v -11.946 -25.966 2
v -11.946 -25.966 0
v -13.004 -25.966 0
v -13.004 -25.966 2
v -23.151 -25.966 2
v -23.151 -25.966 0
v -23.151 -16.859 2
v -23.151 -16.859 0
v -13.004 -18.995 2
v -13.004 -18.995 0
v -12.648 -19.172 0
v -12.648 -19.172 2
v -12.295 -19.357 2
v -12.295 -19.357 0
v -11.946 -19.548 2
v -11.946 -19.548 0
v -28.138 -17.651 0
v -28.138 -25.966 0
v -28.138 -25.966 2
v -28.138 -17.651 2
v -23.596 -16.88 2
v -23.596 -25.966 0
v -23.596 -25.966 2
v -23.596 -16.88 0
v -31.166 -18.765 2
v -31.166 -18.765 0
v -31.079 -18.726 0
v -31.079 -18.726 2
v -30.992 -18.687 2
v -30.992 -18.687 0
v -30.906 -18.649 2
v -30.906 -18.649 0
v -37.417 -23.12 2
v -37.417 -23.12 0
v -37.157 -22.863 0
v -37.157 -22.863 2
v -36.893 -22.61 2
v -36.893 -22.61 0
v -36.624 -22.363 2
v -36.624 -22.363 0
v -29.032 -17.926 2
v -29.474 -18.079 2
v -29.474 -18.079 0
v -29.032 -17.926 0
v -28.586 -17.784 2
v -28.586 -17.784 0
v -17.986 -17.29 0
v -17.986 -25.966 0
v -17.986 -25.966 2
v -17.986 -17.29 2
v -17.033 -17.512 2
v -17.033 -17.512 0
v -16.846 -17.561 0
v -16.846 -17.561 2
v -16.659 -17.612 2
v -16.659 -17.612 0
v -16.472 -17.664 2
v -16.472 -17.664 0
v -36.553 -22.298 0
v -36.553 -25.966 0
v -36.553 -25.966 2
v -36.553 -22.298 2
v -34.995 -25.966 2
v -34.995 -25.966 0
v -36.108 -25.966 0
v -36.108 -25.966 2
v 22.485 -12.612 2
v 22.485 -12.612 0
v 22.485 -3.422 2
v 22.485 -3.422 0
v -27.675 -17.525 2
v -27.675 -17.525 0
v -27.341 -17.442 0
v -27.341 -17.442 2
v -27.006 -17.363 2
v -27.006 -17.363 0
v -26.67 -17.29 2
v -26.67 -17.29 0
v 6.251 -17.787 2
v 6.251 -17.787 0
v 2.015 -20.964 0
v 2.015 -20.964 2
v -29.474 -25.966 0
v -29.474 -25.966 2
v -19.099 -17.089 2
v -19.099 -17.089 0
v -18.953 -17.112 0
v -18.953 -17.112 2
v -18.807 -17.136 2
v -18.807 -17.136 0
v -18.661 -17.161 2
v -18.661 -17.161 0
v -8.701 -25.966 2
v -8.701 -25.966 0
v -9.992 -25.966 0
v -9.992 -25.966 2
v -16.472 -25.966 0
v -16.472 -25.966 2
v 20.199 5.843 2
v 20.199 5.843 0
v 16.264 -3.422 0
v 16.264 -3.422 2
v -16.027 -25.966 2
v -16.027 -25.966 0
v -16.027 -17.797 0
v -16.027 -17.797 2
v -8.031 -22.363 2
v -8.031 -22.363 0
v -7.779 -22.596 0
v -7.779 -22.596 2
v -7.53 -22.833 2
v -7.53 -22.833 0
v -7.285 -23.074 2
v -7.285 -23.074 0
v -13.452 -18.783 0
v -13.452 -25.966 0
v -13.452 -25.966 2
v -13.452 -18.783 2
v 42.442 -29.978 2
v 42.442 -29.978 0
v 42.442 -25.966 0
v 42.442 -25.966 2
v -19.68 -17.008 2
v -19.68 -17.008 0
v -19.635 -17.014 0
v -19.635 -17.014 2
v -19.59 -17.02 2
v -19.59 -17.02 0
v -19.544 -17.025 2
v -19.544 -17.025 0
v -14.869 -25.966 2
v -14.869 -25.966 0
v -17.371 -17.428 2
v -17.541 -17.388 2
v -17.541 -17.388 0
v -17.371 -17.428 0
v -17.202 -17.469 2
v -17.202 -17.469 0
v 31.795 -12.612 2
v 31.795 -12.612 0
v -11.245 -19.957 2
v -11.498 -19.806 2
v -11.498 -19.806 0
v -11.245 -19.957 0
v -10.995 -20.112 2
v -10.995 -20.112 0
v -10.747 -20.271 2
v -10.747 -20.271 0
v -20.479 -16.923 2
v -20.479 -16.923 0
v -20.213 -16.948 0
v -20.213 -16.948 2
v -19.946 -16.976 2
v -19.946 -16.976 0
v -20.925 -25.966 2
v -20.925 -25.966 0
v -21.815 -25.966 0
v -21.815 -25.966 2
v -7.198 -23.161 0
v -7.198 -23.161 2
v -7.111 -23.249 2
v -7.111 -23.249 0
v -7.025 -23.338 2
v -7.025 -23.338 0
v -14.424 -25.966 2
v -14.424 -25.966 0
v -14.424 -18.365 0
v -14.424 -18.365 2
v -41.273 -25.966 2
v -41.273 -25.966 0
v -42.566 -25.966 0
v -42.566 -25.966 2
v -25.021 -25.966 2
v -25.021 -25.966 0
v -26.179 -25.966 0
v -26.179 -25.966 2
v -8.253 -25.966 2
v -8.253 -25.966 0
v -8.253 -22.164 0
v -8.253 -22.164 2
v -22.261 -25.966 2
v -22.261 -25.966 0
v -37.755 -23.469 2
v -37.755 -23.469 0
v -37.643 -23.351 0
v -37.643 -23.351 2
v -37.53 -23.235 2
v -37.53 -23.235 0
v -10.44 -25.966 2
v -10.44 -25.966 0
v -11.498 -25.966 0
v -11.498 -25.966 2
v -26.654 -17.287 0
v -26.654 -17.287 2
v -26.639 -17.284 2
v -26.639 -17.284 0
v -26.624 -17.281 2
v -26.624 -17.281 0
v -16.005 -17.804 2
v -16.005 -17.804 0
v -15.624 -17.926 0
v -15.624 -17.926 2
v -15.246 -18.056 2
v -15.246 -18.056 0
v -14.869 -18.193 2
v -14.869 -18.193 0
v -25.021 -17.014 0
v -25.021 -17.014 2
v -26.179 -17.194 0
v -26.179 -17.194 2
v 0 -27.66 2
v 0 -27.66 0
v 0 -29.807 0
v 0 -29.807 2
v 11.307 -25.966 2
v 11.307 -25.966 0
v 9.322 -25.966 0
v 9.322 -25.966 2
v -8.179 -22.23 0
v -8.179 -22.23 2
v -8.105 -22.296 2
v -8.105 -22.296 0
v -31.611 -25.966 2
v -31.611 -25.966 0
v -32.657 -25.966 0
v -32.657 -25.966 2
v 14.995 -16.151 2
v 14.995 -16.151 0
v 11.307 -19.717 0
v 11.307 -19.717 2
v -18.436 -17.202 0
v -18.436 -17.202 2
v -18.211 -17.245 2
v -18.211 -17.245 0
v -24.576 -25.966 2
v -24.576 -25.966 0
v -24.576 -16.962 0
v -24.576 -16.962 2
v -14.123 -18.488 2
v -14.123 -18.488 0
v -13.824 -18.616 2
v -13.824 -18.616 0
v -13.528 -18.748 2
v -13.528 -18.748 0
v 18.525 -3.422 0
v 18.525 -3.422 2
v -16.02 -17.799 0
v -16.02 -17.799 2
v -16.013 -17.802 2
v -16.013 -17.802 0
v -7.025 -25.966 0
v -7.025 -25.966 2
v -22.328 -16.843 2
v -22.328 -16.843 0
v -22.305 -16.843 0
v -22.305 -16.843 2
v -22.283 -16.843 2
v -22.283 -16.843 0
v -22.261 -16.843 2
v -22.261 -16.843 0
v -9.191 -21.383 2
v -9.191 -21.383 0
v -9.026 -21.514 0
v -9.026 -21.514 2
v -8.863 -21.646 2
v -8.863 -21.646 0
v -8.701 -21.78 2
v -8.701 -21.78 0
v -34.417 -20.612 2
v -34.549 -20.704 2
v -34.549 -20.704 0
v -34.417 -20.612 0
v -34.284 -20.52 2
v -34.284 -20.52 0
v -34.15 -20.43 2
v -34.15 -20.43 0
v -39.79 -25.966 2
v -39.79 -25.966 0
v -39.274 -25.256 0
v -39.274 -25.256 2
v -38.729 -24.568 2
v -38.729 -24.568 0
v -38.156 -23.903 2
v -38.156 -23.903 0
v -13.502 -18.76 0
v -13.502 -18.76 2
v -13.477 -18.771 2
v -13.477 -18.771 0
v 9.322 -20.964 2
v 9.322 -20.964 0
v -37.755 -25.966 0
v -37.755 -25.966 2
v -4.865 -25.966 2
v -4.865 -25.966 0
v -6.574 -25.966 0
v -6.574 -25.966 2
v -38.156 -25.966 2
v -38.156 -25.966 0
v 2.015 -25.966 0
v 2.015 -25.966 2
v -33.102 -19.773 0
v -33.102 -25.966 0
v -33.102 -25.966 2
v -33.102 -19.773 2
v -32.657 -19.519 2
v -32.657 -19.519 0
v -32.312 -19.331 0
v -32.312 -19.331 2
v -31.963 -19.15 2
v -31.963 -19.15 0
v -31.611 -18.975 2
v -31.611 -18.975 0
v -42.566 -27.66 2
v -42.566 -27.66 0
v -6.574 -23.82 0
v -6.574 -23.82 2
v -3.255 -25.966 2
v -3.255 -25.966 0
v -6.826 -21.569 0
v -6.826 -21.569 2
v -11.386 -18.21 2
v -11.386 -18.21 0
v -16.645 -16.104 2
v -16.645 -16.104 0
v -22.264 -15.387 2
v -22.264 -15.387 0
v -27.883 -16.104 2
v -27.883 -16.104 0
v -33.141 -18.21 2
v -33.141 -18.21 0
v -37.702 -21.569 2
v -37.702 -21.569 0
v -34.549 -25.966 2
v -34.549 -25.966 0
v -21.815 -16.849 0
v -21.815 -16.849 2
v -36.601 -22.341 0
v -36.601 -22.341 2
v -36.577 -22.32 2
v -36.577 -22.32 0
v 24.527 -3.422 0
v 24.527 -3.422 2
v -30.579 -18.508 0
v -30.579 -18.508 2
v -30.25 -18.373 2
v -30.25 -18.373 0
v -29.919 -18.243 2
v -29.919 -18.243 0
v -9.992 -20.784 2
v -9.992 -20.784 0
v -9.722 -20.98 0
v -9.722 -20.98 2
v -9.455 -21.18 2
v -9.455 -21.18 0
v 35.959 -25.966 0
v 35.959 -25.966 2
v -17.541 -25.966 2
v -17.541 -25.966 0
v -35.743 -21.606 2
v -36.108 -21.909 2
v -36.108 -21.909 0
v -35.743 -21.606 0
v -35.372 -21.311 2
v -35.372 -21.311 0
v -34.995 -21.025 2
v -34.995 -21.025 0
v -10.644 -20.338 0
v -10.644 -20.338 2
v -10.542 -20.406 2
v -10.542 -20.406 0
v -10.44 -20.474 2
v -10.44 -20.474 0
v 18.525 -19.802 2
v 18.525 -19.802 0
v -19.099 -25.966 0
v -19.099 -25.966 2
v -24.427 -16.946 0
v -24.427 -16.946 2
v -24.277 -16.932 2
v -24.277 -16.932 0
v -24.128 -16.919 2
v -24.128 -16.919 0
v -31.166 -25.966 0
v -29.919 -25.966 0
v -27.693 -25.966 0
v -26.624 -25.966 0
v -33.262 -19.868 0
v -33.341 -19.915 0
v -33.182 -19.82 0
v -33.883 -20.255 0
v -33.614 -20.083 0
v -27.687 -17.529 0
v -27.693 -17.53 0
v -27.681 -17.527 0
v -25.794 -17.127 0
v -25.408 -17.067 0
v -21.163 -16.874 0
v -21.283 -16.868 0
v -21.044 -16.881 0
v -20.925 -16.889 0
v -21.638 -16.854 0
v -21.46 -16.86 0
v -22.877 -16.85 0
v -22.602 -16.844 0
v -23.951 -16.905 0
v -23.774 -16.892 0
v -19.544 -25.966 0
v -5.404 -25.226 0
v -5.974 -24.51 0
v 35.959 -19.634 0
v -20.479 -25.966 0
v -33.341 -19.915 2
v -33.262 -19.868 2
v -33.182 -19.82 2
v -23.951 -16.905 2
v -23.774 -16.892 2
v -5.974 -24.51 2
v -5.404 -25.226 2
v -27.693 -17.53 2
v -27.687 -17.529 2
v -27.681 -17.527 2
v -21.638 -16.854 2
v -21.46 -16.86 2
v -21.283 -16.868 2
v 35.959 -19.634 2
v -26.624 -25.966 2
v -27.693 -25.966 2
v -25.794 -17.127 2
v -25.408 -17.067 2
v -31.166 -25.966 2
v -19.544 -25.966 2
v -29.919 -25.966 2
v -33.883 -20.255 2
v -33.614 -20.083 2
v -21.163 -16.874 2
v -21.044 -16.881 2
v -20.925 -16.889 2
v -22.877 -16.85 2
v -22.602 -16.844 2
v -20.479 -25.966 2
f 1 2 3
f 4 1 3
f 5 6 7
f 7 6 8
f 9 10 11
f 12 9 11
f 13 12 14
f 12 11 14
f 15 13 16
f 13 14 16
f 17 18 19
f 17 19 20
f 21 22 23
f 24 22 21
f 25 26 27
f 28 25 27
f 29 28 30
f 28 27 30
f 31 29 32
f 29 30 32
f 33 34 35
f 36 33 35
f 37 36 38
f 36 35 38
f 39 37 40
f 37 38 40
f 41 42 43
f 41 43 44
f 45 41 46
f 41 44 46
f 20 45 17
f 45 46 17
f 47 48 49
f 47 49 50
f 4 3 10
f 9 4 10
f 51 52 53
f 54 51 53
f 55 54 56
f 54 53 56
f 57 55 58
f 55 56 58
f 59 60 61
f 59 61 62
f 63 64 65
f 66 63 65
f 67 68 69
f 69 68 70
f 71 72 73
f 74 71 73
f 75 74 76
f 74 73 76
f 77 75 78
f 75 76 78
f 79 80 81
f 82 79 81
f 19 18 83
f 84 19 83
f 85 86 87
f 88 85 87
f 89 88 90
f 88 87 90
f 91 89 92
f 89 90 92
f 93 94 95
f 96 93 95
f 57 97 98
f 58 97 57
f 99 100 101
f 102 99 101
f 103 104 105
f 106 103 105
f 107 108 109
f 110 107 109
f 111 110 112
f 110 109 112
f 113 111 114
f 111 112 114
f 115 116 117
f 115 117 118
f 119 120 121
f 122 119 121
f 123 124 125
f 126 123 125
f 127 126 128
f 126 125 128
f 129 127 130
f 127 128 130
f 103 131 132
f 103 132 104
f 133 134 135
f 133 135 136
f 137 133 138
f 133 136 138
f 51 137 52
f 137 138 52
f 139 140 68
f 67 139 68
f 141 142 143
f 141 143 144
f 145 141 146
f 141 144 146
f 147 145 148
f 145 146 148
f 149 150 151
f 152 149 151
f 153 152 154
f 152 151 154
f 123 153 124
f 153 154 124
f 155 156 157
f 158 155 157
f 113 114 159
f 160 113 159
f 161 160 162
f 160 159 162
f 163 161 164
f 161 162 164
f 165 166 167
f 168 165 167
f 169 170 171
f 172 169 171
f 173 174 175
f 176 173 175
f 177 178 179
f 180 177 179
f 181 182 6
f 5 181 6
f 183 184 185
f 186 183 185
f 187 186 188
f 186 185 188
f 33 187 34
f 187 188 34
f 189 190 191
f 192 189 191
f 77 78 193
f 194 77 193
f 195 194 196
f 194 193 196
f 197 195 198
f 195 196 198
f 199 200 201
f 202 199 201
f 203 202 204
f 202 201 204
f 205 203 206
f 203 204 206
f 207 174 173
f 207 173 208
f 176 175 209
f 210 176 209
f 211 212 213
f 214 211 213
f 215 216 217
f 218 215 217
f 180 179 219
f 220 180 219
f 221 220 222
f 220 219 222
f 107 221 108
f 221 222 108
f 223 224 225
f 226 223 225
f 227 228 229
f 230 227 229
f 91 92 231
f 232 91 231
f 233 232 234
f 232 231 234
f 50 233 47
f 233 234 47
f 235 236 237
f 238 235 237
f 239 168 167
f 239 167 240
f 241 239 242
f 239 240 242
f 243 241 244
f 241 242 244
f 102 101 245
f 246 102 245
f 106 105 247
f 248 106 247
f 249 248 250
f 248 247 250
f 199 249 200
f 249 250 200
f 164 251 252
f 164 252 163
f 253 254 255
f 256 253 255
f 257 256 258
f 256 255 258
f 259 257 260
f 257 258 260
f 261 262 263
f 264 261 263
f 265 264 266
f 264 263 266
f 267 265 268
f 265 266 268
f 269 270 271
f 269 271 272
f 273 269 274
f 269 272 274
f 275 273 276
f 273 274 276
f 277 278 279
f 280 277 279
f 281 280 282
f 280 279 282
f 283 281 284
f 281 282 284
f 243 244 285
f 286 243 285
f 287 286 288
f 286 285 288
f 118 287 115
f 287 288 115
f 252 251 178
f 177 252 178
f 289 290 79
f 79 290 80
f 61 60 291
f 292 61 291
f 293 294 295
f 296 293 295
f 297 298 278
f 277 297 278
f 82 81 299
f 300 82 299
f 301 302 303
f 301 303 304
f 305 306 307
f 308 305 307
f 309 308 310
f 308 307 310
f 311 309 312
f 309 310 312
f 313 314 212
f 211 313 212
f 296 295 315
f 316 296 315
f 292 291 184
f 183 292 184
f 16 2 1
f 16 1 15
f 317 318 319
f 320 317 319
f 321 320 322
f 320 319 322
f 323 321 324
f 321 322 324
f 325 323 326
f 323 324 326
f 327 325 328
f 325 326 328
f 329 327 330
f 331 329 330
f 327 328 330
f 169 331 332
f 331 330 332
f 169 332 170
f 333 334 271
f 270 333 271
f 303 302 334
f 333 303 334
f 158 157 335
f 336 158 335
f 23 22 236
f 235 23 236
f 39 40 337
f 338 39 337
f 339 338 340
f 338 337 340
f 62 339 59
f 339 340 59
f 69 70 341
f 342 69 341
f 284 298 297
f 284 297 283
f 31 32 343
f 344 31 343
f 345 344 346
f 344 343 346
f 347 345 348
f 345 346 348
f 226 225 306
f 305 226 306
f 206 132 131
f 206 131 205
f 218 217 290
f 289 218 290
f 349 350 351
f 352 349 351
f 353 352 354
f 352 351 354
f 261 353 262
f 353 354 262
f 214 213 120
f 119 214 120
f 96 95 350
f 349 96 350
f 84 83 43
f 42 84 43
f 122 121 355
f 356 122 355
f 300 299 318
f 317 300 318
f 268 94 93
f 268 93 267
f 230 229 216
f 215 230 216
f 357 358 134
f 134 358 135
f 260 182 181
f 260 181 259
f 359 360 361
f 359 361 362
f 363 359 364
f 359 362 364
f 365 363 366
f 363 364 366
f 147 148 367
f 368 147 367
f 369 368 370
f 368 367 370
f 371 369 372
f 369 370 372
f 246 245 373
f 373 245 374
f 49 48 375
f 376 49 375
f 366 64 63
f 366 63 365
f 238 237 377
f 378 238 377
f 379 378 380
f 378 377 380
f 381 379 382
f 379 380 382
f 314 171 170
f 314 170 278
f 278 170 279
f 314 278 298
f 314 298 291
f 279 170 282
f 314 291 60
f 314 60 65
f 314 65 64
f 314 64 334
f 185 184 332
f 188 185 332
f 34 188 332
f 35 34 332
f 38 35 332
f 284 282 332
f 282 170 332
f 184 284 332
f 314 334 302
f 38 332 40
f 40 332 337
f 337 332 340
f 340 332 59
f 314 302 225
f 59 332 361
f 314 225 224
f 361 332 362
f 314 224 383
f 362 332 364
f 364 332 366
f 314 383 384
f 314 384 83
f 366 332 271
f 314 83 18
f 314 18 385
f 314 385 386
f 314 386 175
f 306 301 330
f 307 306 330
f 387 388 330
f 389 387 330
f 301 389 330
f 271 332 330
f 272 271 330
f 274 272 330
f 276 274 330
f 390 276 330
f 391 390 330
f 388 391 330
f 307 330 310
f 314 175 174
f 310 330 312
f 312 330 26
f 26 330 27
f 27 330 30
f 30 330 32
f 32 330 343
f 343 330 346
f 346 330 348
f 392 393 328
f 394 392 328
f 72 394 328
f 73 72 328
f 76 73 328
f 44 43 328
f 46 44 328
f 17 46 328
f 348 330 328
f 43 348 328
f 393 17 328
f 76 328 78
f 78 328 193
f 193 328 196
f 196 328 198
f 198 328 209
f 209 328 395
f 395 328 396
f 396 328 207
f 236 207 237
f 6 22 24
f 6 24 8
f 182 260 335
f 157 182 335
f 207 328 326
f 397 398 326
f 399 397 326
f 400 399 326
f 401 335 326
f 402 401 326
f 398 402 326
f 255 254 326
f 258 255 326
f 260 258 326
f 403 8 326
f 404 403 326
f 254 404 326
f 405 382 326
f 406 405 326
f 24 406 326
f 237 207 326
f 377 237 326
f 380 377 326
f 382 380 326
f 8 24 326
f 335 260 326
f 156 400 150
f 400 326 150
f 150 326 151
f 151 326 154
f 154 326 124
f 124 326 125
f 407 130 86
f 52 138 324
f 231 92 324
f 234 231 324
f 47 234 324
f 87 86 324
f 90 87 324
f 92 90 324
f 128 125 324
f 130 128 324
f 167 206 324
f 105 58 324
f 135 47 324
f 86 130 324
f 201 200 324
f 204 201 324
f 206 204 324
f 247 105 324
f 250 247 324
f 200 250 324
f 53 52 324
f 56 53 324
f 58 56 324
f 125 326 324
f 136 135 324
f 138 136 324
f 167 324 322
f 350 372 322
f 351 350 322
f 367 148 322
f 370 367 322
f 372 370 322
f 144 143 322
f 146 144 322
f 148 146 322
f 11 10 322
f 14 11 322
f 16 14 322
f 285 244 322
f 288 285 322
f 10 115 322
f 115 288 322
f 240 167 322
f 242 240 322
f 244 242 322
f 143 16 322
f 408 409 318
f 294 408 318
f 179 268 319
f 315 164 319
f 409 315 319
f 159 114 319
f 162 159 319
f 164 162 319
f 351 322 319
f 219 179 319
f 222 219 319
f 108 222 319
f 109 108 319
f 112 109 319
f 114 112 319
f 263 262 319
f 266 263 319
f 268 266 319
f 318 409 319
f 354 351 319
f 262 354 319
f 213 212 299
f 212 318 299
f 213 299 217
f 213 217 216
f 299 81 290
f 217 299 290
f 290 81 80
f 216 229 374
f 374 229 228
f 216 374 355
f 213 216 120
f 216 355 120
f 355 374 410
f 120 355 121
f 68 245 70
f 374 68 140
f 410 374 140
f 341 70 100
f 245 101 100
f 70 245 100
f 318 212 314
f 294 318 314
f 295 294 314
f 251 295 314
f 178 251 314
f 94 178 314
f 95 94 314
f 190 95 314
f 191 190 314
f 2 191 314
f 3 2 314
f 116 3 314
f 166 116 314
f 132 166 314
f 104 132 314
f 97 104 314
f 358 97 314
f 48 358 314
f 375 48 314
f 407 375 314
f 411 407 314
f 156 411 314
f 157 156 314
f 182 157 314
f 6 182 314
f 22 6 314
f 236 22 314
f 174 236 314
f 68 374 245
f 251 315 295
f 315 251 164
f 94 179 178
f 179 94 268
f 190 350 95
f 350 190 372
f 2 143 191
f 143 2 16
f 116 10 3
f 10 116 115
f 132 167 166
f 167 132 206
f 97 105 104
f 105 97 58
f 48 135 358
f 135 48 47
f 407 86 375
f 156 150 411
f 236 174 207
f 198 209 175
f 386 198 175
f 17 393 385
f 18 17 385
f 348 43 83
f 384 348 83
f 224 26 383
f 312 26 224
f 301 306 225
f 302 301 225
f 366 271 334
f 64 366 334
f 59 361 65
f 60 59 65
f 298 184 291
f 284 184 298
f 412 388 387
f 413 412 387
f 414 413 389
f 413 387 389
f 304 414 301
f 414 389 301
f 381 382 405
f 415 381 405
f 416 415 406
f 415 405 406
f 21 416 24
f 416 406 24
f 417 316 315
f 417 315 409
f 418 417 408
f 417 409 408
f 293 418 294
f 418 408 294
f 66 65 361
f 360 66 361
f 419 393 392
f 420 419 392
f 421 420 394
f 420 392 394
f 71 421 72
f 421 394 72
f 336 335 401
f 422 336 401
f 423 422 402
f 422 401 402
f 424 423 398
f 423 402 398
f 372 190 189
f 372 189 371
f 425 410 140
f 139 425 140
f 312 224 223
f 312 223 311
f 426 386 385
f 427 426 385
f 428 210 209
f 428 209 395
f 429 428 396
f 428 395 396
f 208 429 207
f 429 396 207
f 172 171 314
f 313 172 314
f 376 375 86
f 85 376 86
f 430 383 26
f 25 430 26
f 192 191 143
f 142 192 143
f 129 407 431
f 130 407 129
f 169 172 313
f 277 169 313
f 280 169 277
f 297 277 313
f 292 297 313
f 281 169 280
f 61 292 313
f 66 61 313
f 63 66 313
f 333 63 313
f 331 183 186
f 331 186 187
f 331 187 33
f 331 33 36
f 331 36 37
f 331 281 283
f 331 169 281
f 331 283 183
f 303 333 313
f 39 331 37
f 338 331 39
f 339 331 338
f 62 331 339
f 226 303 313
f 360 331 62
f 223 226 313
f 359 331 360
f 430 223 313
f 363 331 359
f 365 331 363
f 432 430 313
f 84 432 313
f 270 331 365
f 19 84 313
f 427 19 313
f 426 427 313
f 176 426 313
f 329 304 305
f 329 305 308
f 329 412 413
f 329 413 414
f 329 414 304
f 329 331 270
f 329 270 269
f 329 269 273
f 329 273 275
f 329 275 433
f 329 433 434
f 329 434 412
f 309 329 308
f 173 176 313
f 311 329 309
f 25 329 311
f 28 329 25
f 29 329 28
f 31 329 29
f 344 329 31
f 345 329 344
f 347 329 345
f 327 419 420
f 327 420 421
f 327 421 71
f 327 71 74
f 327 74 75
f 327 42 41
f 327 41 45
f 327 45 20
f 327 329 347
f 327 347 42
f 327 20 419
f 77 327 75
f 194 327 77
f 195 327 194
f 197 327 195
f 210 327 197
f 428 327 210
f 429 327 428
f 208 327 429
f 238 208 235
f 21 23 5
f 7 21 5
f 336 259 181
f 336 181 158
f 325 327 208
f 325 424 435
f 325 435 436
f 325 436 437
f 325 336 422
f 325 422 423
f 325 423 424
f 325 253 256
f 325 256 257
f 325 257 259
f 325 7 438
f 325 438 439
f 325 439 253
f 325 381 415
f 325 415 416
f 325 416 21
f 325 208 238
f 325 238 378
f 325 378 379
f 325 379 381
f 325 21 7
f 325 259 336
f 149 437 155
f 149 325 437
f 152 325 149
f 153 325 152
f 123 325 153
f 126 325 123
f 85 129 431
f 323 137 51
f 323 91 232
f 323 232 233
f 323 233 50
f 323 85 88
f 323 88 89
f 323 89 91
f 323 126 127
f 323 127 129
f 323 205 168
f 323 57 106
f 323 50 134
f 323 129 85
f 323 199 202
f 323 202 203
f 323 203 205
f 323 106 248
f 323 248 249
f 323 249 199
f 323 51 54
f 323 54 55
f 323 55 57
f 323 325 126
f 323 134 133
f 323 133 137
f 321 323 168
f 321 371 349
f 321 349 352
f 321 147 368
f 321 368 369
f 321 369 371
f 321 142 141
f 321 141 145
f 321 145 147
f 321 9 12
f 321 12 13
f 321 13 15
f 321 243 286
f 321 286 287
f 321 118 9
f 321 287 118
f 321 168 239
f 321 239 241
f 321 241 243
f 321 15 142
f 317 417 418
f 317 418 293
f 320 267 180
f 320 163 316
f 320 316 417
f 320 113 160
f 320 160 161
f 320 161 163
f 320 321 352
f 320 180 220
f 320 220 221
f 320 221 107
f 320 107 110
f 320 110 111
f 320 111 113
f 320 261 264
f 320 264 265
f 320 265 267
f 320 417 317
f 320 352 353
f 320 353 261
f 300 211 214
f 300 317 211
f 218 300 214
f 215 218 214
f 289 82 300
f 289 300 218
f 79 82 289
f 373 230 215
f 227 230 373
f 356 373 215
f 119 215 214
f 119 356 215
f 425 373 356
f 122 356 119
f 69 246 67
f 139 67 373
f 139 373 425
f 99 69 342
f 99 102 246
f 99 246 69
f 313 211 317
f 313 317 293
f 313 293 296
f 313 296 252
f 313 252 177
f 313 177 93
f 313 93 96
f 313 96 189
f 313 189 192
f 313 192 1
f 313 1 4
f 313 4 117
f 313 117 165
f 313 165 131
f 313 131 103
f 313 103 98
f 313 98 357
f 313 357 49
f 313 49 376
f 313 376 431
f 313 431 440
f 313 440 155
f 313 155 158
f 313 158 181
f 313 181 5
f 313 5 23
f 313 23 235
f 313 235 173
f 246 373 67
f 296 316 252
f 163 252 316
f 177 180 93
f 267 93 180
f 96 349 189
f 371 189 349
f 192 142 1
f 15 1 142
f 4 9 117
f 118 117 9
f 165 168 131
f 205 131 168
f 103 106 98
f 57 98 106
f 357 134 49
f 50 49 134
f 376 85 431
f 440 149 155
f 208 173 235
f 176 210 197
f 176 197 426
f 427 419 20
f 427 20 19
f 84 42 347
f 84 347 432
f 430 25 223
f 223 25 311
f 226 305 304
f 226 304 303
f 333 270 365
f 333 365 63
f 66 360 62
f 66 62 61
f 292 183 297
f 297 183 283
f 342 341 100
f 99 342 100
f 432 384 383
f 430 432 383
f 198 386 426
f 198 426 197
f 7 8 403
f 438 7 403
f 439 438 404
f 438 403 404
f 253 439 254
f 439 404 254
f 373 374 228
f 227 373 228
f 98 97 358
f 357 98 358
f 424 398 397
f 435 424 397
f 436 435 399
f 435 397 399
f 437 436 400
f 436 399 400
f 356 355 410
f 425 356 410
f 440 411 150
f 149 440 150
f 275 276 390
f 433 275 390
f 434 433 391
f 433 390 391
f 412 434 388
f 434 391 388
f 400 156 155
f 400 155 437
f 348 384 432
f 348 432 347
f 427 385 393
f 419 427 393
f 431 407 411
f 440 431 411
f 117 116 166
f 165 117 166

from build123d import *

# Parameters (mm, degrees)
F2_DEPTH = 2
F3_W     = 0.40073
F3_H     = 3.094508
F3_W_2   = 0.445254
F3_H_2   = 4.318954
F3_H_3   = 5.565662
F3_H_4   = 6.723319
F3_W_3   = 0.445252
F3_H_5   = 7.725138
F3_H_6   = 8.370755
F3_H_7   = 8.83827
F3_H_8   = 9.105423
F3_W_4   = 0.445253
F3_H_9   = 9.506151
F3_H_10  = 9.439363
F3_H_11  = 9.083159
F3_H_12  = 8.459806
F3_W_5   = 0.448172
F3_H_13  = 8.174662
F3_H_14  = 6.776365
F3_H_15  = 5.736604
F3_H_16  = 4.678918
F3_W_6   = 0.451199
F3_H_17  = 3.560012
F4_DEPTH = 2


with BuildPart() as f2:
    # F1 (on face) → F2 (new body)
    with BuildSketch(Plane.XY):
        Polygon((-42.565533, -25.966065), (-42.565533, -27.660457), (0, -27.660457), (0, -25.966065), (-3.254796, -25.966065), (-4.865278, -25.966065), (-6.80548, -25.966065), (-7.284604, -25.966065), (-8.611036, -25.966065), (-9.190797, -25.966065), (-10.747001, -25.966065), (-11.576914, -25.966065), (-13.527635, -25.966065), (-14.543153, -25.966065), (-16.00546, -25.966065), (-17.032834, -25.966065), (-18.660922, -25.966065), (-19.680227, -25.966065), (-21.282767, -25.966065), (-22.327718, -25.966065), (-24.128009, -25.966065), (-24.945042, -25.966065), (-26.6696, -25.966065), (-27.674529, -25.966065), (-29.783733, -25.966065), (-30.905583, -25.966065), (-33.341274, -25.966065), (-34.150291, -25.966065), (-36.62416, -25.966065), (-37.416613, -25.966065), (-39.790157, -25.966065), (-41.272748, -25.966065), align=None)
        Polygon((0, -25.966065), (0, -27.660457), (0, -29.807076), (42.442255, -29.978171), (42.442255, -25.966065), (37.837461, -25.966065), (35.959285, -25.966065), (35.959285, -19.634349), (31.794641, -12.611612), (22.485428, -12.611612), (22.485428, -3.422375), (24.526922, -3.422375), (20.198954, 5.84349), (16.263861, -3.422375), (18.525192, -3.422375), (18.525192, -19.802407), (14.995469, -16.15097), (11.306624, -19.716855), (11.306624, -25.966065), (9.322134, -25.966065), (9.322134, -20.964459), (6.251046, -17.787471), (2.015062, -20.964459), (2.015062, -25.966065), align=None)
        with BuildLine():
            ThreePointArc((-3.254796, -25.966065), (-22.263772, -15.386694), (-41.272748, -25.966065))
            Line((-41.272748, -25.966065), (-39.790157, -25.966065))
            ThreePointArc((-39.790157, -25.966065), (-38.665481, -24.491199), (-37.416613, -23.119903))
            ThreePointArc((-37.416613, -23.119903), (-37.025265, -22.73615), (-36.62416, -22.362606))
            ThreePointArc((-36.62416, -22.362606), (-35.422916, -21.350754), (-34.150291, -20.430287))
            ThreePointArc((-34.150291, -20.430287), (-33.748684, -20.16832), (-33.341274, -19.915471))
            ThreePointArc((-33.341274, -19.915471), (-32.143886, -19.242725), (-30.905583, -18.648645))
            ThreePointArc((-30.905583, -18.648645), (-30.347908, -18.41234), (-29.783733, -18.192007))
            ThreePointArc((-29.783733, -18.192007), (-28.7378, -17.831313), (-27.674529, -17.525486))
            ThreePointArc((-27.674529, -17.525486), (-27.17349, -17.401847), (-26.6696, -17.290397))
            ThreePointArc((-26.6696, -17.290397), (-25.810262, -17.129587), (-24.945042, -17.00422))
            ThreePointArc((-24.945042, -17.00422), (-24.536938, -16.957621), (-24.128009, -16.91891))
            ThreePointArc((-24.128009, -16.91891), (-23.228672, -16.861684), (-22.327718, -16.842597))
            ThreePointArc((-22.327718, -16.842597), (-21.805084, -16.849018), (-21.282767, -16.868277))
            ThreePointArc((-21.282767, -16.868277), (-20.480176, -16.922976), (-19.680227, -17.007981))
            ThreePointArc((-19.680227, -17.007981), (-19.169648, -17.078313), (-18.660922, -17.160994))
            ThreePointArc((-18.660922, -17.160994), (-17.843441, -17.320594), (-17.032834, -17.512072))
            ThreePointArc((-17.032834, -17.512072), (-16.517316, -17.651472), (-16.00546, -17.803769))
            ThreePointArc((-16.00546, -17.803769), (-15.269621, -18.047594), (-14.543153, -18.318065))
            ThreePointArc((-14.543153, -18.318065), (-14.032607, -18.526492), (-13.527635, -18.748083))
            ThreePointArc((-13.527635, -18.748083), (-12.539214, -19.228362), (-11.576914, -19.759042))
            ThreePointArc((-11.576914, -19.759042), (-11.159024, -20.010256), (-10.747001, -20.270981))
            ThreePointArc((-10.747001, -20.270981), (-9.956389, -20.809703), (-9.190797, -21.383427))
            ThreePointArc((-9.190797, -21.383427), (-8.602301, -21.862673), (-8.031275, -22.362606))
            ThreePointArc((-8.031275, -22.362606), (-7.653628, -22.713766), (-7.284604, -23.073977))
            ThreePointArc((-7.284604, -23.073977), (-7.043039, -23.319504), (-6.80548, -23.568909))
            ThreePointArc((-6.80548, -23.568909), (-5.791883, -24.732282), (-4.865278, -25.966065))
            Line((-4.865278, -25.966065), (-3.254796, -25.966065))
        make_face()
    extrude(amount=F2_DEPTH)

    # F3 (on face) → F4 (join)
    with BuildSketch(Plane.XY):
        with Locations((-37.955668, -24.606134)):
            Rectangle(F3_W, F3_H)
        with Locations((-36.330495, -23.904861)):
            Rectangle(F3_W_2, F3_H_2)
        with Locations((-34.772109, -23.236981)):
            Rectangle(F3_W_2, F3_H_3)
        with Locations((-32.879785, -22.658152)):
            Rectangle(F3_W_2, F3_H_4)
        with Locations((-31.388187, -22.201769)):
            Rectangle(F3_W_3, F3_H_5)
        with Locations((-29.696227, -21.87896)):
            Rectangle(F3_W_3, F3_H_6)
        with Locations((-27.915214, -21.689728)):
            Rectangle(F3_W_3, F3_H_7)
        with Locations((-26.401355, -21.533888)):
            Rectangle(F3_W_3, F3_H_8)
        with Locations((-24.798444, -21.333524)):
            Rectangle(F3_W_4, F3_H_9)
        with Locations((-23.373634, -21.333524)):
            Rectangle(F3_W_4, F3_H_9)
        with Locations((-22.037876, -21.30013)):
            Rectangle(F3_W_3, F3_H_10)
        with Locations((-20.702117, -21.333524)):
            Rectangle(F3_W_3, F3_H_9)
        with Locations((-19.321834, -21.30013)):
            Rectangle(F3_W_3, F3_H_10)
        with Locations((-17.763448, -21.30013)):
            Rectangle(F3_W_3, F3_H_10)
        with Locations((-16.249589, -21.567283)):
            Rectangle(F3_W_3, F3_H_11)
        with Locations((-14.646677, -21.834435)):
            Rectangle(F3_W_3, F3_H_12)
        with Locations((-13.227864, -21.954445)):
            Rectangle(F3_W_5, F3_H_13)
        with Locations((-11.722005, -22.653593)):
            Rectangle(F3_W_5, F3_H_14)
        with Locations((-10.216147, -23.24518)):
            Rectangle(F3_W_5, F3_H_15)
        with Locations((-8.477238, -23.720243)):
            Rectangle(F3_W_5, F3_H_16)
        with Locations((-6.799724, -24.328857)):
            Rectangle(F3_W_6, F3_H_17)
    extrude(amount=F4_DEPTH)


solid = f2.part
